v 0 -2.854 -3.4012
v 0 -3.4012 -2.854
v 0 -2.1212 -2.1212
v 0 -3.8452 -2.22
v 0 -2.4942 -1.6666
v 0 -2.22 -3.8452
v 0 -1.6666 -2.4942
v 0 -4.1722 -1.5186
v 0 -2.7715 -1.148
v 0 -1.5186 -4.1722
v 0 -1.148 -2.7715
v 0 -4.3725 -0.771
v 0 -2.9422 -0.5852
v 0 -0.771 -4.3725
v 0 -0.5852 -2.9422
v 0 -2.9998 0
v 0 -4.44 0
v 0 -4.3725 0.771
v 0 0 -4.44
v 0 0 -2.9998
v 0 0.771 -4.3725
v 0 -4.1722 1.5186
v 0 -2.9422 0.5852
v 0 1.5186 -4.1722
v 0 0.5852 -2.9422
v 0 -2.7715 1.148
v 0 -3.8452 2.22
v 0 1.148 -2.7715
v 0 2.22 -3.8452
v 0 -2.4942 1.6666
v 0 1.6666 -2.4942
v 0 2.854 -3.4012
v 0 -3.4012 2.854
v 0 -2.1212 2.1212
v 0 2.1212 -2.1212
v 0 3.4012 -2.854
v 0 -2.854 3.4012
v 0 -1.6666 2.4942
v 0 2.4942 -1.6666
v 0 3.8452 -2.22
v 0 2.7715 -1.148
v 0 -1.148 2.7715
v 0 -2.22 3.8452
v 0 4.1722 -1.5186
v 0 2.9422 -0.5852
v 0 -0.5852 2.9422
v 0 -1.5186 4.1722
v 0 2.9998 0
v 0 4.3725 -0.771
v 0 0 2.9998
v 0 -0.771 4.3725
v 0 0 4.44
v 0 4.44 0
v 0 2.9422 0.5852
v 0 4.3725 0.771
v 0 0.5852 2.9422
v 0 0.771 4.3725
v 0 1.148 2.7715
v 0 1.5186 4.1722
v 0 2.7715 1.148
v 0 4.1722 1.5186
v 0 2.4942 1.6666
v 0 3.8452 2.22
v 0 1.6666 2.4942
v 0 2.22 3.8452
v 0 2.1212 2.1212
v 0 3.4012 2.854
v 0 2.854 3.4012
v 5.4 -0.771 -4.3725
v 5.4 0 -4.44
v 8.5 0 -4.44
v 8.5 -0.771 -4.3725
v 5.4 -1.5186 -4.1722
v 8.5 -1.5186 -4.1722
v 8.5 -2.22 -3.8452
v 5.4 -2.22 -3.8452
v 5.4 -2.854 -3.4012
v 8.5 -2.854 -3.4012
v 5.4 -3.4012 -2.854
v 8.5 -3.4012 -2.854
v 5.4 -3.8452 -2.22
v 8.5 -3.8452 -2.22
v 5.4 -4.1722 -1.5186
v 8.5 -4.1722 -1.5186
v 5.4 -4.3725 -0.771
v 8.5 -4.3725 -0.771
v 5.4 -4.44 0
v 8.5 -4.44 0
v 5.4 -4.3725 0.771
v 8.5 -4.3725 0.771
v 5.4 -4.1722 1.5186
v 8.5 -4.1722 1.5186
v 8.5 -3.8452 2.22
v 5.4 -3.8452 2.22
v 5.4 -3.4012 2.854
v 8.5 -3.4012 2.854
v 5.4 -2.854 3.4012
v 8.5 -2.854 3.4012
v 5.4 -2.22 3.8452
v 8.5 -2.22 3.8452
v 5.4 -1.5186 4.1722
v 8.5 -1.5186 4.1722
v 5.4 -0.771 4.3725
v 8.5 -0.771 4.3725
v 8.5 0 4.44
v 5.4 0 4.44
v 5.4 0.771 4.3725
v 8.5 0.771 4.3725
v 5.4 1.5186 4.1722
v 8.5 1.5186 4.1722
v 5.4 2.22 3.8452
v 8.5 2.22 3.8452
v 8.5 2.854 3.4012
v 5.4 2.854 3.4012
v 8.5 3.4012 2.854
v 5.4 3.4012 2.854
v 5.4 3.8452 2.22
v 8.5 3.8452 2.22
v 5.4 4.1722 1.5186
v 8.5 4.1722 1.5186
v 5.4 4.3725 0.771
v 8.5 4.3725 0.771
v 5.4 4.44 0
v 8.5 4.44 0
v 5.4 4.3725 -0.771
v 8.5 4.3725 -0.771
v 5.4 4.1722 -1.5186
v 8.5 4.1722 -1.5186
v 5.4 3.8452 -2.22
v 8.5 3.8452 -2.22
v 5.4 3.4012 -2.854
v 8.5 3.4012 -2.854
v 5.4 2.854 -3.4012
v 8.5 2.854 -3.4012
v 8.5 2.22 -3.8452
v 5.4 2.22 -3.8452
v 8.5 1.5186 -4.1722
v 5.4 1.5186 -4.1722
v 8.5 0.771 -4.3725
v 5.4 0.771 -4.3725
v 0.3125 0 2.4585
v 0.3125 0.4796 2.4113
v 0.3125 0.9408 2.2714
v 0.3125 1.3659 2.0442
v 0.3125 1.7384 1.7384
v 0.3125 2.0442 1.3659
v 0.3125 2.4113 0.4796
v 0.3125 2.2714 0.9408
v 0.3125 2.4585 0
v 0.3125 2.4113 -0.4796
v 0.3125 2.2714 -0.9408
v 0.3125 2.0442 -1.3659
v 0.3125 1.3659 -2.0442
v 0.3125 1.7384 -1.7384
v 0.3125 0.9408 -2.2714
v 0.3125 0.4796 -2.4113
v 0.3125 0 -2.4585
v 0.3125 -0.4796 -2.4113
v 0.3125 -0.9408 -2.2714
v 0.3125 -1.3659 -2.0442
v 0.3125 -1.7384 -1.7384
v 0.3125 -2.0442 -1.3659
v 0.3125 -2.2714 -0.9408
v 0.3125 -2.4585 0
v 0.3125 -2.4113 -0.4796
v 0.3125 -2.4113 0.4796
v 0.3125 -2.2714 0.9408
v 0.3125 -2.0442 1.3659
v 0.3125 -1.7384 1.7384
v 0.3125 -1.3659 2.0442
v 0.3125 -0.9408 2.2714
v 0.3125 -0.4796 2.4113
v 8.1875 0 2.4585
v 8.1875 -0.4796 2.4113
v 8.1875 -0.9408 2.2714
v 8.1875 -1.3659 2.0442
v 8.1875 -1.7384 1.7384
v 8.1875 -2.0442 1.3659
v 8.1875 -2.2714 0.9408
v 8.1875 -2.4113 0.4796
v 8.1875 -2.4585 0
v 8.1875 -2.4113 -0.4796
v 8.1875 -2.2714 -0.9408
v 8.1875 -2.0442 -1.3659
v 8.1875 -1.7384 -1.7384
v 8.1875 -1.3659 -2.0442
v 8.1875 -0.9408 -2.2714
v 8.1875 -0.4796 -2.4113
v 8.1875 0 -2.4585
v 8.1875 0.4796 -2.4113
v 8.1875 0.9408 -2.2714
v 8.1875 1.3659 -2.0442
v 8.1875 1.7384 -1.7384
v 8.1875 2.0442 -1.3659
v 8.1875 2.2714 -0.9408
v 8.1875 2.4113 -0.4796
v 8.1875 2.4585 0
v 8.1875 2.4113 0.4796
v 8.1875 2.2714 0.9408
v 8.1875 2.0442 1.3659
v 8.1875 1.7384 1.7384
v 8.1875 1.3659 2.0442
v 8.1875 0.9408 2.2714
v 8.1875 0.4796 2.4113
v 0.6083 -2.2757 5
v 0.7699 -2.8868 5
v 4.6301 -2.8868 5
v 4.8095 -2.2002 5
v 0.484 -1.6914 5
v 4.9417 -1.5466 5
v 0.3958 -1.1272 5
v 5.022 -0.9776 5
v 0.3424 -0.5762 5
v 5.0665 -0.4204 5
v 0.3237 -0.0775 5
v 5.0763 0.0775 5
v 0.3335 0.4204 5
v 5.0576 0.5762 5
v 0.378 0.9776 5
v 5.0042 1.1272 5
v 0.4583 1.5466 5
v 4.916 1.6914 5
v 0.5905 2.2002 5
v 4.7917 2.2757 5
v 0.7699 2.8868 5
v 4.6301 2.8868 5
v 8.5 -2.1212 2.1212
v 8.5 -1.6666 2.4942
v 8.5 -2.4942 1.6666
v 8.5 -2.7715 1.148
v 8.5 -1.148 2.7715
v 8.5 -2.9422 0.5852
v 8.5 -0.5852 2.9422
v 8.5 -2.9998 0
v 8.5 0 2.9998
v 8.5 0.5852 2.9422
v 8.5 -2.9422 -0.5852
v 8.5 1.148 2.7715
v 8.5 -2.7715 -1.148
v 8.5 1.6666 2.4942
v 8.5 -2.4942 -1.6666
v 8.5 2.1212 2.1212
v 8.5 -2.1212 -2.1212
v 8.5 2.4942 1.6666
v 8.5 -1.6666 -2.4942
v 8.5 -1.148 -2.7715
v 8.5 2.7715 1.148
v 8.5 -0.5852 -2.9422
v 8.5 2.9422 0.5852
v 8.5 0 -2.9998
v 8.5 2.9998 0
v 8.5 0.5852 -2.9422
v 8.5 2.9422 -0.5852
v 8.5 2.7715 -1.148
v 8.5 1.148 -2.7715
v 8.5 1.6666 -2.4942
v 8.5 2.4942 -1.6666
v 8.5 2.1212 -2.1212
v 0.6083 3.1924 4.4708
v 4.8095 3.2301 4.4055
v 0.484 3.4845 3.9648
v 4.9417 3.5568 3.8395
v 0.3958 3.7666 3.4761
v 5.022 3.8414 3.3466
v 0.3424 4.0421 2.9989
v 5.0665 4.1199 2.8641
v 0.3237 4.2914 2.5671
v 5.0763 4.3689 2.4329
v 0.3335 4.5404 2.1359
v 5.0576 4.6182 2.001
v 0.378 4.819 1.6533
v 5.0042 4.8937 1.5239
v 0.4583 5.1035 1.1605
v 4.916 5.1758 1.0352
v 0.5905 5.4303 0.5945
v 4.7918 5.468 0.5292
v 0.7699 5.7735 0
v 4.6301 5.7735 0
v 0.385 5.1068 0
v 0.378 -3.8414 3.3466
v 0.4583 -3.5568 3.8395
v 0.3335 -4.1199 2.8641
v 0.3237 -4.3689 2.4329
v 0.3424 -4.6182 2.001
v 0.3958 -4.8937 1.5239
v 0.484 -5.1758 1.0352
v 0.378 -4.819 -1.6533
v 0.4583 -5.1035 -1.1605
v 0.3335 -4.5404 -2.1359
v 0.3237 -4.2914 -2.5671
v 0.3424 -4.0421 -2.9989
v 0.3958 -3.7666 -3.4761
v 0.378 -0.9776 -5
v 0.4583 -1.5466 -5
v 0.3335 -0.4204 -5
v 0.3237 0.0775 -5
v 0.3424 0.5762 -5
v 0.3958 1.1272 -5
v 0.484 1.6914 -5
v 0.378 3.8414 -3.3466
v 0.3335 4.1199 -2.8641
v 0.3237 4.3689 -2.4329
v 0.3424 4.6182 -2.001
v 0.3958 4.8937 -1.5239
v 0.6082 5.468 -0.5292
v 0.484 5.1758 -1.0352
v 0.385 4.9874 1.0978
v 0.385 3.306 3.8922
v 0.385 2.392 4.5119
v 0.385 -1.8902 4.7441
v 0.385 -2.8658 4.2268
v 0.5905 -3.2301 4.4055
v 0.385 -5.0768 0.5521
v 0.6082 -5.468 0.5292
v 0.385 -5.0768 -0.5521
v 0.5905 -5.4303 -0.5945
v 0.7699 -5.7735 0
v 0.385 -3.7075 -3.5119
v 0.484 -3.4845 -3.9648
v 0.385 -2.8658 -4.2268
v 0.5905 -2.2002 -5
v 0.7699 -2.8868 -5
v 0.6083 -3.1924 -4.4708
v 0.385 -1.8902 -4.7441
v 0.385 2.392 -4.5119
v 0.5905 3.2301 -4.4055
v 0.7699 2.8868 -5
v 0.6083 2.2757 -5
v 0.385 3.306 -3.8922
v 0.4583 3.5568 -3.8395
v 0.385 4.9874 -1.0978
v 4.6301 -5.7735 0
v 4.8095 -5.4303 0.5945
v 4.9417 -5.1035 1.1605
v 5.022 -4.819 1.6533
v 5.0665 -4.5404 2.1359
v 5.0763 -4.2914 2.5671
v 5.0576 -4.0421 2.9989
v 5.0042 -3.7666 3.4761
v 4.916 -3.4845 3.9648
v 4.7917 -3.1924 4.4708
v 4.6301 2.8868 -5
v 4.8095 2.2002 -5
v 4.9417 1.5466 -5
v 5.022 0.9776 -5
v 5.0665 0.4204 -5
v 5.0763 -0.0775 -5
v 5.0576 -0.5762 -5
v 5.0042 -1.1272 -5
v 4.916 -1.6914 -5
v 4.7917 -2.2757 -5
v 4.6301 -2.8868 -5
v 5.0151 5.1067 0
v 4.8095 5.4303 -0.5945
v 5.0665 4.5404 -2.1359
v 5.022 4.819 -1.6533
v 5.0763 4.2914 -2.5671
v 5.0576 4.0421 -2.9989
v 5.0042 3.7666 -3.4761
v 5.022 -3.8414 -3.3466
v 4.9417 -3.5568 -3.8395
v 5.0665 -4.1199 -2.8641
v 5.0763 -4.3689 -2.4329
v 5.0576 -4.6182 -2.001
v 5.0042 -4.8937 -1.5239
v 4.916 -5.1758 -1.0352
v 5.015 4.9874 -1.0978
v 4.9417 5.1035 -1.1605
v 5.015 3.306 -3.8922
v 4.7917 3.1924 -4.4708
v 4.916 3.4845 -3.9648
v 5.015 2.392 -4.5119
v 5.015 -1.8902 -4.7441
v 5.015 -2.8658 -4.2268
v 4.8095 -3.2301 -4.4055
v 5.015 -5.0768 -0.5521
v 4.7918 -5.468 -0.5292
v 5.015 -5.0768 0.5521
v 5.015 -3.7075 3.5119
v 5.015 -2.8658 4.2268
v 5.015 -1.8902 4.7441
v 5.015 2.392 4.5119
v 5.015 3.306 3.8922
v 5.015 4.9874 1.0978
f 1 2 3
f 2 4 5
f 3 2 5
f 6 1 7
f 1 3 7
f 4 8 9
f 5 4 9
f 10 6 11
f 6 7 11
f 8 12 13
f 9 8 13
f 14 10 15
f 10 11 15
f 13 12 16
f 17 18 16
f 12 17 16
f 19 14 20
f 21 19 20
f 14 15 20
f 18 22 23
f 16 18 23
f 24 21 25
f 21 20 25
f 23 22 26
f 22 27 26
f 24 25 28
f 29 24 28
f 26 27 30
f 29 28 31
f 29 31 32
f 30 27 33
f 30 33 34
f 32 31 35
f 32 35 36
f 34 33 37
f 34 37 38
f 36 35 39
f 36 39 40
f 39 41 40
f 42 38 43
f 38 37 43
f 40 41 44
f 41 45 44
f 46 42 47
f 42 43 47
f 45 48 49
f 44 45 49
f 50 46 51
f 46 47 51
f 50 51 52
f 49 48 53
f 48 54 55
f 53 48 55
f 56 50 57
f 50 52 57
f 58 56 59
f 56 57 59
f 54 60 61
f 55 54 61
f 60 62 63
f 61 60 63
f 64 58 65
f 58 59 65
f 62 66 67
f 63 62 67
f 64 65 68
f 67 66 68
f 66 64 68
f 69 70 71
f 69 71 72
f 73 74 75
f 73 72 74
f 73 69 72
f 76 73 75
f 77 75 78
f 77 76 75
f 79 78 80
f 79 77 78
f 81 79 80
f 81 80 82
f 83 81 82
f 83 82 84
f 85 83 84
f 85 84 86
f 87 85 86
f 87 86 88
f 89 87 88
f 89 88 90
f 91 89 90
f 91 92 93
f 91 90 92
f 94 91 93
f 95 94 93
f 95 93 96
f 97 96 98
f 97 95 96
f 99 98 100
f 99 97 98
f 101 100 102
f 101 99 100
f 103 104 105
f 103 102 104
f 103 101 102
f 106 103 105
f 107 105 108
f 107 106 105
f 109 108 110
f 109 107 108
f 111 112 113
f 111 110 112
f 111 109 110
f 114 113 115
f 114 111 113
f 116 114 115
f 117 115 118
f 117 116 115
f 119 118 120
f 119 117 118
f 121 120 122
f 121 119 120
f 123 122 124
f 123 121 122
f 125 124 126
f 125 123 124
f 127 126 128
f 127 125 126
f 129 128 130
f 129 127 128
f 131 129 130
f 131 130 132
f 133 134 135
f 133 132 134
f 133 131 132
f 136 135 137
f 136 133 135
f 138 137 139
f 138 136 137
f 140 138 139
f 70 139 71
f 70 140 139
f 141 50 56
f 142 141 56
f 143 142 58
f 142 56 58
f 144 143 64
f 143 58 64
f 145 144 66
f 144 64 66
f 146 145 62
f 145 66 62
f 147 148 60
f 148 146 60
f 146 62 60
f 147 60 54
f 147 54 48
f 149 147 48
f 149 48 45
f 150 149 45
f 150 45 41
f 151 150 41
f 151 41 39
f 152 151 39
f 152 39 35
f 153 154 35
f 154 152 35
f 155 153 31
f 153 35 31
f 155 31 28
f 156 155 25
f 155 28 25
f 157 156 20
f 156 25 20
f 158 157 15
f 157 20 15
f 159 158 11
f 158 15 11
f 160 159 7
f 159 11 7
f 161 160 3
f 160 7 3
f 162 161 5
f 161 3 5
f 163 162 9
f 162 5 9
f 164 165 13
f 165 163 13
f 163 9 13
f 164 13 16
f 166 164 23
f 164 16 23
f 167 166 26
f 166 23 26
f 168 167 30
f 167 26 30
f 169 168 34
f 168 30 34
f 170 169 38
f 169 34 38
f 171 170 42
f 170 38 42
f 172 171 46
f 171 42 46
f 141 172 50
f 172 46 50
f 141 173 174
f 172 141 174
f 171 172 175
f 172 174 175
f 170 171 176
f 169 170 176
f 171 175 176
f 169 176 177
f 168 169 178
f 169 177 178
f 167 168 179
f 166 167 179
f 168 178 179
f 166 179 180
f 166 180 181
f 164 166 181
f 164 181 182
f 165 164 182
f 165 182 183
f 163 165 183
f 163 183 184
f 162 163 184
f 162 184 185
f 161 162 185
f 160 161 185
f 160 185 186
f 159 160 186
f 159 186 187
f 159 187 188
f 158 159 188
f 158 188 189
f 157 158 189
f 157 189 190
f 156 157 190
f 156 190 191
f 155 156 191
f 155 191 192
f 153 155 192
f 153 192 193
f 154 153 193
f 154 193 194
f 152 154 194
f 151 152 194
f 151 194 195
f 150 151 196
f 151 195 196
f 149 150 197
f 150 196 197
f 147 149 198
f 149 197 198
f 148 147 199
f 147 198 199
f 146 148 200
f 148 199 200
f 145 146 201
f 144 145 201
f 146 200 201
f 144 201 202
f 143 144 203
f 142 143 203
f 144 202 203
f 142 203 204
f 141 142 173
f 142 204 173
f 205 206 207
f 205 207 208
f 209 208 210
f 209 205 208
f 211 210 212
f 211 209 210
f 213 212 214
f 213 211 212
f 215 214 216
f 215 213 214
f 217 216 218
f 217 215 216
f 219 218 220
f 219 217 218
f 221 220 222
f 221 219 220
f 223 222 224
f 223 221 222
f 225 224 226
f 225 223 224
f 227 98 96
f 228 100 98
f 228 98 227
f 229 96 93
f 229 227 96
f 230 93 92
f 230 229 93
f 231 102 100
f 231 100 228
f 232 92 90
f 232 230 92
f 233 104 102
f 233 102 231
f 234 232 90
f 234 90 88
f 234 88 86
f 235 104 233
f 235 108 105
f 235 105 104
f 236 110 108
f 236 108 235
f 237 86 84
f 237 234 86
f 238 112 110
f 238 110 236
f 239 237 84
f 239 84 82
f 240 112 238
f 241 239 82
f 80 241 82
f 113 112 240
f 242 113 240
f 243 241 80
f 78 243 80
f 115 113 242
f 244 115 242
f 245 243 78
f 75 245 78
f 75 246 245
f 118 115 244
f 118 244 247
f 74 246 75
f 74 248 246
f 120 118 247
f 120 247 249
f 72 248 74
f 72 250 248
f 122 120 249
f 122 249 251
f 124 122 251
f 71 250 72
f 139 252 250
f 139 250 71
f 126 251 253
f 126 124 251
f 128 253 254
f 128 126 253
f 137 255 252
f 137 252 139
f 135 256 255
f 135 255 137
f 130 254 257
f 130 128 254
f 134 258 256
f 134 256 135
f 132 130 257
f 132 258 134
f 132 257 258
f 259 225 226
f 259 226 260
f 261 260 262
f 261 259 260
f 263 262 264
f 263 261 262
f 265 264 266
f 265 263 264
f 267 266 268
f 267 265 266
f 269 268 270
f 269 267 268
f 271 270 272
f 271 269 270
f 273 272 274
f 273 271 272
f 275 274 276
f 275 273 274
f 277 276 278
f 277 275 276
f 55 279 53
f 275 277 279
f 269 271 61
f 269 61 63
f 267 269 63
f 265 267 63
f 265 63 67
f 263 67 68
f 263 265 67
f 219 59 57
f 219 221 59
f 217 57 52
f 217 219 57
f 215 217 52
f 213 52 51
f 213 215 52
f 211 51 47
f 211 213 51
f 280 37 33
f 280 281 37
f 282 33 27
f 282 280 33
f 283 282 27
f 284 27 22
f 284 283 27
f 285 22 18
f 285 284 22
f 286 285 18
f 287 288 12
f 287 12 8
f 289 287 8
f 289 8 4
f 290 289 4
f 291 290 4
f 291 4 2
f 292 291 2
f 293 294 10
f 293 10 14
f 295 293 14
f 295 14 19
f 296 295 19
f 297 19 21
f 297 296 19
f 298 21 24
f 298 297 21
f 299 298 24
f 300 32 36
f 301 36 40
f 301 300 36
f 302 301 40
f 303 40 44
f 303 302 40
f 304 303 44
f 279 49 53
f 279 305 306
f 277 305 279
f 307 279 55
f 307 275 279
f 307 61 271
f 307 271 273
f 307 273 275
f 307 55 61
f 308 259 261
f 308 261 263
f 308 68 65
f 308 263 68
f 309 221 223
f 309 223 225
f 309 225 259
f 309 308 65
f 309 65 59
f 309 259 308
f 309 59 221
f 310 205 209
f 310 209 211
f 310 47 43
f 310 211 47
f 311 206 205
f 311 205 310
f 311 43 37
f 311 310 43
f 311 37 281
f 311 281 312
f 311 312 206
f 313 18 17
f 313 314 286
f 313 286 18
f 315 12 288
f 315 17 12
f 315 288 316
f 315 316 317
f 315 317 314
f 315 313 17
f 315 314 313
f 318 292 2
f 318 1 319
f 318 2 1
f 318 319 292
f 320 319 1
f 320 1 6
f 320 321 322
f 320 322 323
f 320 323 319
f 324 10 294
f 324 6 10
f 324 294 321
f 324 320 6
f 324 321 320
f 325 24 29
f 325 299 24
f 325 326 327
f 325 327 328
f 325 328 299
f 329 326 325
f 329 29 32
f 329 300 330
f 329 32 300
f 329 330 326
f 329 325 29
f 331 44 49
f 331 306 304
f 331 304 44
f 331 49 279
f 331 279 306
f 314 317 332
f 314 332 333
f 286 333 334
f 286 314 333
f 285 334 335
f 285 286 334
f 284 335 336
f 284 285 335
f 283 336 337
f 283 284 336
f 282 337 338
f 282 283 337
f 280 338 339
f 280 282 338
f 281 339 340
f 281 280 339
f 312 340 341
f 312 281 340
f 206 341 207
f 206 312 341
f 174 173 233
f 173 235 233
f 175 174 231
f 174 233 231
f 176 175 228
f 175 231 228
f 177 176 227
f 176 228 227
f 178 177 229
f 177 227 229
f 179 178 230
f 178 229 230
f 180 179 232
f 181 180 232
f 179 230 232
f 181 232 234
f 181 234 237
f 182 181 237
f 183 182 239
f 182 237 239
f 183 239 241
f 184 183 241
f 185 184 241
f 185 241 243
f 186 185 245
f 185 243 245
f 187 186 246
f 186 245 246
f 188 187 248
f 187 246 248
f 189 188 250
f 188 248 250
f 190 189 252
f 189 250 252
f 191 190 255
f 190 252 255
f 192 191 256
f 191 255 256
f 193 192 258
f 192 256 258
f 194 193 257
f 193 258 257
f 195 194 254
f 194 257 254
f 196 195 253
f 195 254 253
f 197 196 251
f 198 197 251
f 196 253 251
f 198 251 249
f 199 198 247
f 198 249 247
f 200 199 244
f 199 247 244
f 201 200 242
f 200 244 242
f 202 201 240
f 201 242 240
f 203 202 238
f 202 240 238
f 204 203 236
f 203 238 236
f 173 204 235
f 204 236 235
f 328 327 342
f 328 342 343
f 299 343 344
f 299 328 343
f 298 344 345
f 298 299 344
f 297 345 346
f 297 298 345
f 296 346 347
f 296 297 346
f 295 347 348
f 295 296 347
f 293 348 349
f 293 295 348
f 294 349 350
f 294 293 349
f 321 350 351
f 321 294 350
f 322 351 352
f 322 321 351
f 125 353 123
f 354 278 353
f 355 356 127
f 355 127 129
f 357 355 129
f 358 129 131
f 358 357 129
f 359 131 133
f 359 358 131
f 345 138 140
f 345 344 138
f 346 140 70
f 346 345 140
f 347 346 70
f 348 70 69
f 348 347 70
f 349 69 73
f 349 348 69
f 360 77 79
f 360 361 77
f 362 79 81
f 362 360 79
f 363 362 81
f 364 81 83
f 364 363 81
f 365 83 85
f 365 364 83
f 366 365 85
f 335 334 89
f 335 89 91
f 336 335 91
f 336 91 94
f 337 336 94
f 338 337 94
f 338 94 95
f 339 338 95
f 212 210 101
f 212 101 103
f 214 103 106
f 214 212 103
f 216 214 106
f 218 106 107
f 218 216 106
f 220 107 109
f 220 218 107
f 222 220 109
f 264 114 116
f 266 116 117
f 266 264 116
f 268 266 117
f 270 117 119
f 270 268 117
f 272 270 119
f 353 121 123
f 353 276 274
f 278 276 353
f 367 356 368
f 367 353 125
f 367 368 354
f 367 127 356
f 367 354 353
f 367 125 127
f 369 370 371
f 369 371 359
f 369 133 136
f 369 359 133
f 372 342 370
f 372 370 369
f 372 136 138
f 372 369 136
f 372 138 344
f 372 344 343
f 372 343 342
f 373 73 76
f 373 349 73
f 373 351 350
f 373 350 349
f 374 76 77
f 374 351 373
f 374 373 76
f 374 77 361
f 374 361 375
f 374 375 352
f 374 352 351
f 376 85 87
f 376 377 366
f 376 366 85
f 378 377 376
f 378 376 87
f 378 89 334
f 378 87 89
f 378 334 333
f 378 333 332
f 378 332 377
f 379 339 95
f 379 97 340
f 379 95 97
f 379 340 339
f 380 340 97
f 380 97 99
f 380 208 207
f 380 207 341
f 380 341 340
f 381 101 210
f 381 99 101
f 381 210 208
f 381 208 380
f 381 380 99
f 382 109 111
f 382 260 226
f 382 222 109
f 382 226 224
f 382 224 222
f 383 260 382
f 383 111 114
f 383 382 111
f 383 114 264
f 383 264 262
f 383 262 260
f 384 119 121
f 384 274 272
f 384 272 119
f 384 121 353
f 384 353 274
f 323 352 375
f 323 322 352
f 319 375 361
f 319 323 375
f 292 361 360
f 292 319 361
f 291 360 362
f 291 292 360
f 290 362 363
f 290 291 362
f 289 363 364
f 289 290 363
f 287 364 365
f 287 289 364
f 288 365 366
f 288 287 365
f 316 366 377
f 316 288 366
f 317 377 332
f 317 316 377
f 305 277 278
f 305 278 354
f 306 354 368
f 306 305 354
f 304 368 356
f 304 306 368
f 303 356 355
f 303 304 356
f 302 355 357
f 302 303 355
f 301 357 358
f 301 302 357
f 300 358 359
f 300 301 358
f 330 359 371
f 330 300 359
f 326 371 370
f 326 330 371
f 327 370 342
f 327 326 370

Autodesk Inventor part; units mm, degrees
ref_plane "YZ Plane" through (0, 0, 0) normal (1, 0, 0) x (0, 1, 0)
ref_plane "XZ Plane" through (0, 0, 0) normal (0, 1, 0) x (-1, 0, 0)
sketch "Sketch1" plane through (0, 0, 0) normal (1, 0, 0) x (0, 1, 0)
  line L0 (2.8868, -5) -> (-2.8868, -5)
  line L1 (-2.8868, -5) -> (-5.7735, 0)
  line L2 (-5.7735, 0) -> (-2.8868, 5)
  line L3 (-2.8868, 5) -> (2.8868, 5)
  line L4 (2.8868, 5) -> (5.7735, 0)
  line L5 (5.7735, 0) -> (2.8868, -5)
  point P0 (0, 0)
  point P1 (0, 0)
  dimension "d0" = 11.547
extrude "Body" add sketch "Sketch1" along normal blind 5.4
sketch "Sketch2" plane through (5.4, 0, 0) normal (1, 0, 0) x (0, 0, -1)
  circle A0 centre (0, 0) radius 4.44
  dimension "d7" = 8.88
extrude "Ring" add sketch "Sketch2" along normal blind 3.1
sketch "Sketch3" plane through (0, 0, 0) normal (0, 0, 1) x (1, 0, 0)
  line L0 (0, 2.8868) -> (0, 5.7735) projected
  line L1 (0, 5.7735) -> (5.4, 5.7735) projected
  line L2 (5.4, 2.8868) -> (5.4, 5.7735) projected
  line L3 (-1.08, 0) -> (6.48, 0) projected
  line L4 (0, 4.44) -> (0.7699, 5.7735)
  line L5 (4.6301, 5.7735) -> (5.4, 4.44)
  dimension "d3" = 30
  dimension "d4" = 30
  dimension "d5" = 8.88
  dimension "d6" = 8.88
revolve "Chamfer1" cut sketch "Sketch3" angle 360 about axis through (-10, 0, 0) along (1, 0, 0)
sketch "Sketch4" plane through (0, 0, 0) normal (-1, 0, 0) x (0, 0, 1)
  line L0 (0, -8.0829) -> (0, 8.0829) projected
  line L1 (-7, 0) -> (7, 0) projected
  point P0 (0, 0)
hole "Thread" at (0, 0, 0) direction (1, 0, 0) diameter 4.917 end through all thread size "M6x1" class "6H" standard "ISO Metric profile"
chamfer "Chamfer2" distance 0.5413 angle 30 1 edges at (0, 0, -2.4585) measured on face at (0, 3.7305, -0.453)
chamfer "Chamfer3" distance 0.5413 angle 30 1 edges at (8.5, 0, -2.4585) measured on face at (8.5, -0.5503, -3.7127)
ref_plane "Work Plane1" through (17.5119, 0, 0) normal (0, 0, 1) x (-1, 0, 0)
equation "\"d0\" = 1.1547 * SW"
equation "\"d1\" = KOH1"
equation "\"d7\" = SD2"
equation "\"d8\" = KOH - KOH1"
equation "\"d3\" = ANG1"
equation "\"d4\" = ANG2"
equation "\"d5\" = SW0"
equation "\"d6\" = SW01"
equation "\"d10\" = -0.5 * GD1 + 0.5 * NND"
equation "\"d46\" = -0.5 * GD1 + 0.5 * NND"
equation "\"d12\" = -0.5 * GD1 + 0.5 * NND"
equation "\"d47\" = -0.5 * GD1 + 0.5 * NND"
equation "\"ANG1\" = 30deg"
equation "\"ANG2\" = 30deg"
equation "\"NND\" = 6"
equation "\"KOH1\" = 5.4"
equation "\"KOH\" = 8.5"
equation "\"SW0\" = 8.88"
equation "\"SW01\" = SW0"
equation "\"SD2\" = SW0"
equation "\"GUL\" = 0.541266 * PTC"
equation "\"THREADDIA\" = 6"
equation "\"TOA\" = 30deg"
equation "\"PTC\" = 1"
equation "\"GAL\" = 0.541266 * PTC"
equation "\"E0\" = 1.155 * SW"
equation "\"SW\" = 10"
equation "\"GD1\" = 4.917468"
properties part number "ISO 7041 - M6" material "Steel"
